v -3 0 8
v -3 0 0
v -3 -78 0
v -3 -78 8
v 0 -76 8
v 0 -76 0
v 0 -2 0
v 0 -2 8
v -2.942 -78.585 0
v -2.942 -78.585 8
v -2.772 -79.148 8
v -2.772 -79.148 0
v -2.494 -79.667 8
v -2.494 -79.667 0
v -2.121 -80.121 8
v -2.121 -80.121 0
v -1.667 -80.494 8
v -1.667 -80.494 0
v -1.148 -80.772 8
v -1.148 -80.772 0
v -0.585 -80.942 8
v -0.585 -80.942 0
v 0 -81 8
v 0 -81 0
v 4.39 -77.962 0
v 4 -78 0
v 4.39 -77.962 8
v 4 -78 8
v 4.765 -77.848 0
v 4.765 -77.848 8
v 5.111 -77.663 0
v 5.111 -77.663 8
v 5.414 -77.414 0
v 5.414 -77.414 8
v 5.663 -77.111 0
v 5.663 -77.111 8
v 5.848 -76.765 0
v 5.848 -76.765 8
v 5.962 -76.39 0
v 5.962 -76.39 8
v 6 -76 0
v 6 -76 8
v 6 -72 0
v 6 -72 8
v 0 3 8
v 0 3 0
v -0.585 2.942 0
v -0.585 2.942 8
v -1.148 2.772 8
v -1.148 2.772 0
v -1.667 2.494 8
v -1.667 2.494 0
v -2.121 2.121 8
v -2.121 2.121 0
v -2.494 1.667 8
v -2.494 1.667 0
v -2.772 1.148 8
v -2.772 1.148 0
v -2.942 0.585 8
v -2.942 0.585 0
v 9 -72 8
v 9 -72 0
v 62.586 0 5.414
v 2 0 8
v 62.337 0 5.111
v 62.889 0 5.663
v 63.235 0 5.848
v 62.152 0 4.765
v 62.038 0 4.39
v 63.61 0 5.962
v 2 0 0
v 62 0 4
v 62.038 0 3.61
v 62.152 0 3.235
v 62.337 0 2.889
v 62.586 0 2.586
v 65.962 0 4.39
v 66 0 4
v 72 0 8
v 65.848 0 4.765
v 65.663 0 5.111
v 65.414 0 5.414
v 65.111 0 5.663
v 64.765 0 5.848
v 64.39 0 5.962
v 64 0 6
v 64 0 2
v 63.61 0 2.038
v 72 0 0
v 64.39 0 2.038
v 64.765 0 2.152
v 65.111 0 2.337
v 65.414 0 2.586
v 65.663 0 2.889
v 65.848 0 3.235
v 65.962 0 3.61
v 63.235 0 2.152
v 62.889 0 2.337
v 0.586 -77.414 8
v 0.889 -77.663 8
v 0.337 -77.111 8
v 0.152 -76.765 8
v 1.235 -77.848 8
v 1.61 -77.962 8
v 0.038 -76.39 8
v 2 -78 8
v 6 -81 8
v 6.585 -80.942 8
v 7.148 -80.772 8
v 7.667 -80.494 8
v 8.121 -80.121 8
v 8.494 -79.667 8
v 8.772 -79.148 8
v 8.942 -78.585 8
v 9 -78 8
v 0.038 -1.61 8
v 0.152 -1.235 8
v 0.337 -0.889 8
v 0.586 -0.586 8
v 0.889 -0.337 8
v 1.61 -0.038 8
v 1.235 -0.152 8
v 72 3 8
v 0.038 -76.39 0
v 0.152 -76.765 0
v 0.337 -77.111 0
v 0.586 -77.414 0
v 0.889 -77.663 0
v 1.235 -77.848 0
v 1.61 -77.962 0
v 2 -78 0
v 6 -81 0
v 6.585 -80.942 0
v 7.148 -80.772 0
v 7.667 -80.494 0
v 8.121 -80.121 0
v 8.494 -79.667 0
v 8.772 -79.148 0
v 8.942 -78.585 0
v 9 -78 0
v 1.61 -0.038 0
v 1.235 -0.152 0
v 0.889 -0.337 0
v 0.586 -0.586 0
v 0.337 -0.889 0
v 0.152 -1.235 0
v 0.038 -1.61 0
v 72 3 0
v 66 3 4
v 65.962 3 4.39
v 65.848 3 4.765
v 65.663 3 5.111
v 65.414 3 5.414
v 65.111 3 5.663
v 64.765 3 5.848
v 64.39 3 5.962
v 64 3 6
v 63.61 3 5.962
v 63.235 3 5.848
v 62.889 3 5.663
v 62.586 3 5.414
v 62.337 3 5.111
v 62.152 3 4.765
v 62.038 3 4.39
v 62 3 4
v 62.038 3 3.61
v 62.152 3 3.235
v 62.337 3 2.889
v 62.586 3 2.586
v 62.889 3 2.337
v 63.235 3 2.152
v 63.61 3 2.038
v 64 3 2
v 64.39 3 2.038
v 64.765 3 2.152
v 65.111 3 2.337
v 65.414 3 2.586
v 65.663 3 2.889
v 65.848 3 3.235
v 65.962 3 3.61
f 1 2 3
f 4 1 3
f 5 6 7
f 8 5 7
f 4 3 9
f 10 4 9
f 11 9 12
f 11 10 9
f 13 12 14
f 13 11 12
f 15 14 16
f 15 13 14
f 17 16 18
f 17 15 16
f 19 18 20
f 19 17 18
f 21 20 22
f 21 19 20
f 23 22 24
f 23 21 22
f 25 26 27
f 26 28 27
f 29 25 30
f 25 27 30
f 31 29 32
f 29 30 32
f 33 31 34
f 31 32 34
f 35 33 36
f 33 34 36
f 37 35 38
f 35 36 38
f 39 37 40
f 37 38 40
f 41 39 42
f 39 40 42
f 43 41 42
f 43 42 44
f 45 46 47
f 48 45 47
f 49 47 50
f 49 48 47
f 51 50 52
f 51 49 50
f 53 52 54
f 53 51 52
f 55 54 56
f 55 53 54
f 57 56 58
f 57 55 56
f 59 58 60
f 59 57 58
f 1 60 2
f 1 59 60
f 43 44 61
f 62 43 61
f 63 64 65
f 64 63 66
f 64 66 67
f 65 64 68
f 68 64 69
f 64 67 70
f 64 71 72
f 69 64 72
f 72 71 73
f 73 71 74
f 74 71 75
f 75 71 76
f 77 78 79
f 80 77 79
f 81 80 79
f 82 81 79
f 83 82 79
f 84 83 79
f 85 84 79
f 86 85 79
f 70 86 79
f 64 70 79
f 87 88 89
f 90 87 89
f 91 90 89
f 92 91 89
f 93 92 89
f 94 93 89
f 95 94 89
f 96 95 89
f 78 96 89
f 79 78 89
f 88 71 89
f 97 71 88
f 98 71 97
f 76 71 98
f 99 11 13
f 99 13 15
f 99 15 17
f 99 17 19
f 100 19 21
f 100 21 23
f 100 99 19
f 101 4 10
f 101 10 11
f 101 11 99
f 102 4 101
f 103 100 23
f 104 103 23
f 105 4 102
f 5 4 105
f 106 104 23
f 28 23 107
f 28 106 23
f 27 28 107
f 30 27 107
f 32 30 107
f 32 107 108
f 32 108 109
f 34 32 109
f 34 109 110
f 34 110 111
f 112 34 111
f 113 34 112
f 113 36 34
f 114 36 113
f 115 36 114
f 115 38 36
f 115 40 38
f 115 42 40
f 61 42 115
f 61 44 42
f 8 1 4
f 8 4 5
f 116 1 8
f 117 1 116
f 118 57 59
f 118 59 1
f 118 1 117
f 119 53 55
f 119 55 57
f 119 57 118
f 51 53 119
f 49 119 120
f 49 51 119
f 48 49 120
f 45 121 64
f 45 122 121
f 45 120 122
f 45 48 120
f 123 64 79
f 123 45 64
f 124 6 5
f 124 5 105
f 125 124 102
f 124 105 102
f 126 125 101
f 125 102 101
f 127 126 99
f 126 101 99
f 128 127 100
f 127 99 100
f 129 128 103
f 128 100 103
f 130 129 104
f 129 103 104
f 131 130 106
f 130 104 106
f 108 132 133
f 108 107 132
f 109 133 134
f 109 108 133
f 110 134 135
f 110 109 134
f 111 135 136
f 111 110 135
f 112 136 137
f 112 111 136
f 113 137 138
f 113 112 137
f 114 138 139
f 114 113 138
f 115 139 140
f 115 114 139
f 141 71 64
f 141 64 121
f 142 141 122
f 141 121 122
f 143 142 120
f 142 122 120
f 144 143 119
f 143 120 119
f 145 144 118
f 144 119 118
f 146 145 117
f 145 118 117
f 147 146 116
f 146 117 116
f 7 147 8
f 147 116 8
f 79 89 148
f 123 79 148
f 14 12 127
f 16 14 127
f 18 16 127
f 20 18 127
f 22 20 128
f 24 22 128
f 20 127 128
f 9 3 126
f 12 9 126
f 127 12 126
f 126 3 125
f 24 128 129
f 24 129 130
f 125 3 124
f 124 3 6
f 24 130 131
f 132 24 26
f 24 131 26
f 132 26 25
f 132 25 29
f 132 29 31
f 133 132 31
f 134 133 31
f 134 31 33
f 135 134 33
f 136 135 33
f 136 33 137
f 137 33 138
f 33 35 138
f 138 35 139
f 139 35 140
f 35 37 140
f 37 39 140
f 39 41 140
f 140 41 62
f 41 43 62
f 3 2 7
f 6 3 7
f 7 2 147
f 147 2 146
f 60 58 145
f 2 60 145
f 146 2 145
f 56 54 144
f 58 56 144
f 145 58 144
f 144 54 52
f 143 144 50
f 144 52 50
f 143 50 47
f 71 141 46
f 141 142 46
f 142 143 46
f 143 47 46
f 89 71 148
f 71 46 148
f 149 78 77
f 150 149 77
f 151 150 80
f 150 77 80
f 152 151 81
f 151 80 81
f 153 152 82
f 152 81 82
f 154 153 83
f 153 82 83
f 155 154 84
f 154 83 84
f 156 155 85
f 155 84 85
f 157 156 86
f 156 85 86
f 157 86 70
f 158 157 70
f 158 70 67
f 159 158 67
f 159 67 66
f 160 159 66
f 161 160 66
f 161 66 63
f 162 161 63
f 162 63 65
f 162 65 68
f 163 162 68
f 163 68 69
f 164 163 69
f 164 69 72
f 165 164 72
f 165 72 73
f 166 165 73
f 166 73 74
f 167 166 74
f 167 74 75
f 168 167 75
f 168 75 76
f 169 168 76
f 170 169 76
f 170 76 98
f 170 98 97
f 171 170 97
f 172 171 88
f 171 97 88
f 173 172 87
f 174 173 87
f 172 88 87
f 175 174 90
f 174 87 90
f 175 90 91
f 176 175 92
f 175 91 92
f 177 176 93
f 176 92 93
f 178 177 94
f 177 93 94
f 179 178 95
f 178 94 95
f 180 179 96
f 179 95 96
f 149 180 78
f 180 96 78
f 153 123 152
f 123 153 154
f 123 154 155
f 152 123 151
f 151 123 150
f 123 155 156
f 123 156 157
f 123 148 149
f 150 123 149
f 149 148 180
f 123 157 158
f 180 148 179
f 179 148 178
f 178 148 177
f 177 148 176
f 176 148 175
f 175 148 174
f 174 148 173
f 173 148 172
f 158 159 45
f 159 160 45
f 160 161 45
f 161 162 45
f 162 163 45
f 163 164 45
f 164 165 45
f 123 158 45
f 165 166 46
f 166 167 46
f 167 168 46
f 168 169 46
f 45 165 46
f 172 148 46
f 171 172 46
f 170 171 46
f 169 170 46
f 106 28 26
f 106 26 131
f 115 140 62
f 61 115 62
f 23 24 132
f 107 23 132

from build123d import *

# Parameters (mm, degrees)
F0_W     = 3
F0_H     = 6
F1_DEPTH = 8
F3_D     = 4
F3_DEPTH = 10
F4_R     = 3
F5_R     = 2


with BuildPart() as f1:
    # F0 (on Top) → F1 (new body)
    with BuildSketch(Plane.XY):
        Polygon((0, -78), (0, 0), (72, 0), (72, 3), (-3, 3), (-3, -81), (9, -81), (9, -78), (6, -78), align=None)
        with Locations((7.5, -75)):
            Rectangle(F0_W, F0_H)
    extrude(amount=F1_DEPTH)

    # F3
    with Locations(Plane(origin=(0, 3, 0), x_dir=(-1, 0, 0), z_dir=(0, 1, 0))):
        with Locations((-64, 4)):
            Hole(F3_D / 2, depth=F3_DEPTH)

    # F4
    f4_edges = [f1.edges().sort_by_distance(p)[0] for p in [
        (-3, -81, 4),
        (-3, 3, 4),
        (9, -81, 4),
    ]]
    fillet(f4_edges, radius=F4_R)

    # F5
    f5_edges = [f1.edges().sort_by_distance(p)[0] for p in [
        (6, -78, 4),
        (0, -78, 4),
        (0, 0, 4),
    ]]
    fillet(f5_edges, radius=F5_R)


solid = f1.part
